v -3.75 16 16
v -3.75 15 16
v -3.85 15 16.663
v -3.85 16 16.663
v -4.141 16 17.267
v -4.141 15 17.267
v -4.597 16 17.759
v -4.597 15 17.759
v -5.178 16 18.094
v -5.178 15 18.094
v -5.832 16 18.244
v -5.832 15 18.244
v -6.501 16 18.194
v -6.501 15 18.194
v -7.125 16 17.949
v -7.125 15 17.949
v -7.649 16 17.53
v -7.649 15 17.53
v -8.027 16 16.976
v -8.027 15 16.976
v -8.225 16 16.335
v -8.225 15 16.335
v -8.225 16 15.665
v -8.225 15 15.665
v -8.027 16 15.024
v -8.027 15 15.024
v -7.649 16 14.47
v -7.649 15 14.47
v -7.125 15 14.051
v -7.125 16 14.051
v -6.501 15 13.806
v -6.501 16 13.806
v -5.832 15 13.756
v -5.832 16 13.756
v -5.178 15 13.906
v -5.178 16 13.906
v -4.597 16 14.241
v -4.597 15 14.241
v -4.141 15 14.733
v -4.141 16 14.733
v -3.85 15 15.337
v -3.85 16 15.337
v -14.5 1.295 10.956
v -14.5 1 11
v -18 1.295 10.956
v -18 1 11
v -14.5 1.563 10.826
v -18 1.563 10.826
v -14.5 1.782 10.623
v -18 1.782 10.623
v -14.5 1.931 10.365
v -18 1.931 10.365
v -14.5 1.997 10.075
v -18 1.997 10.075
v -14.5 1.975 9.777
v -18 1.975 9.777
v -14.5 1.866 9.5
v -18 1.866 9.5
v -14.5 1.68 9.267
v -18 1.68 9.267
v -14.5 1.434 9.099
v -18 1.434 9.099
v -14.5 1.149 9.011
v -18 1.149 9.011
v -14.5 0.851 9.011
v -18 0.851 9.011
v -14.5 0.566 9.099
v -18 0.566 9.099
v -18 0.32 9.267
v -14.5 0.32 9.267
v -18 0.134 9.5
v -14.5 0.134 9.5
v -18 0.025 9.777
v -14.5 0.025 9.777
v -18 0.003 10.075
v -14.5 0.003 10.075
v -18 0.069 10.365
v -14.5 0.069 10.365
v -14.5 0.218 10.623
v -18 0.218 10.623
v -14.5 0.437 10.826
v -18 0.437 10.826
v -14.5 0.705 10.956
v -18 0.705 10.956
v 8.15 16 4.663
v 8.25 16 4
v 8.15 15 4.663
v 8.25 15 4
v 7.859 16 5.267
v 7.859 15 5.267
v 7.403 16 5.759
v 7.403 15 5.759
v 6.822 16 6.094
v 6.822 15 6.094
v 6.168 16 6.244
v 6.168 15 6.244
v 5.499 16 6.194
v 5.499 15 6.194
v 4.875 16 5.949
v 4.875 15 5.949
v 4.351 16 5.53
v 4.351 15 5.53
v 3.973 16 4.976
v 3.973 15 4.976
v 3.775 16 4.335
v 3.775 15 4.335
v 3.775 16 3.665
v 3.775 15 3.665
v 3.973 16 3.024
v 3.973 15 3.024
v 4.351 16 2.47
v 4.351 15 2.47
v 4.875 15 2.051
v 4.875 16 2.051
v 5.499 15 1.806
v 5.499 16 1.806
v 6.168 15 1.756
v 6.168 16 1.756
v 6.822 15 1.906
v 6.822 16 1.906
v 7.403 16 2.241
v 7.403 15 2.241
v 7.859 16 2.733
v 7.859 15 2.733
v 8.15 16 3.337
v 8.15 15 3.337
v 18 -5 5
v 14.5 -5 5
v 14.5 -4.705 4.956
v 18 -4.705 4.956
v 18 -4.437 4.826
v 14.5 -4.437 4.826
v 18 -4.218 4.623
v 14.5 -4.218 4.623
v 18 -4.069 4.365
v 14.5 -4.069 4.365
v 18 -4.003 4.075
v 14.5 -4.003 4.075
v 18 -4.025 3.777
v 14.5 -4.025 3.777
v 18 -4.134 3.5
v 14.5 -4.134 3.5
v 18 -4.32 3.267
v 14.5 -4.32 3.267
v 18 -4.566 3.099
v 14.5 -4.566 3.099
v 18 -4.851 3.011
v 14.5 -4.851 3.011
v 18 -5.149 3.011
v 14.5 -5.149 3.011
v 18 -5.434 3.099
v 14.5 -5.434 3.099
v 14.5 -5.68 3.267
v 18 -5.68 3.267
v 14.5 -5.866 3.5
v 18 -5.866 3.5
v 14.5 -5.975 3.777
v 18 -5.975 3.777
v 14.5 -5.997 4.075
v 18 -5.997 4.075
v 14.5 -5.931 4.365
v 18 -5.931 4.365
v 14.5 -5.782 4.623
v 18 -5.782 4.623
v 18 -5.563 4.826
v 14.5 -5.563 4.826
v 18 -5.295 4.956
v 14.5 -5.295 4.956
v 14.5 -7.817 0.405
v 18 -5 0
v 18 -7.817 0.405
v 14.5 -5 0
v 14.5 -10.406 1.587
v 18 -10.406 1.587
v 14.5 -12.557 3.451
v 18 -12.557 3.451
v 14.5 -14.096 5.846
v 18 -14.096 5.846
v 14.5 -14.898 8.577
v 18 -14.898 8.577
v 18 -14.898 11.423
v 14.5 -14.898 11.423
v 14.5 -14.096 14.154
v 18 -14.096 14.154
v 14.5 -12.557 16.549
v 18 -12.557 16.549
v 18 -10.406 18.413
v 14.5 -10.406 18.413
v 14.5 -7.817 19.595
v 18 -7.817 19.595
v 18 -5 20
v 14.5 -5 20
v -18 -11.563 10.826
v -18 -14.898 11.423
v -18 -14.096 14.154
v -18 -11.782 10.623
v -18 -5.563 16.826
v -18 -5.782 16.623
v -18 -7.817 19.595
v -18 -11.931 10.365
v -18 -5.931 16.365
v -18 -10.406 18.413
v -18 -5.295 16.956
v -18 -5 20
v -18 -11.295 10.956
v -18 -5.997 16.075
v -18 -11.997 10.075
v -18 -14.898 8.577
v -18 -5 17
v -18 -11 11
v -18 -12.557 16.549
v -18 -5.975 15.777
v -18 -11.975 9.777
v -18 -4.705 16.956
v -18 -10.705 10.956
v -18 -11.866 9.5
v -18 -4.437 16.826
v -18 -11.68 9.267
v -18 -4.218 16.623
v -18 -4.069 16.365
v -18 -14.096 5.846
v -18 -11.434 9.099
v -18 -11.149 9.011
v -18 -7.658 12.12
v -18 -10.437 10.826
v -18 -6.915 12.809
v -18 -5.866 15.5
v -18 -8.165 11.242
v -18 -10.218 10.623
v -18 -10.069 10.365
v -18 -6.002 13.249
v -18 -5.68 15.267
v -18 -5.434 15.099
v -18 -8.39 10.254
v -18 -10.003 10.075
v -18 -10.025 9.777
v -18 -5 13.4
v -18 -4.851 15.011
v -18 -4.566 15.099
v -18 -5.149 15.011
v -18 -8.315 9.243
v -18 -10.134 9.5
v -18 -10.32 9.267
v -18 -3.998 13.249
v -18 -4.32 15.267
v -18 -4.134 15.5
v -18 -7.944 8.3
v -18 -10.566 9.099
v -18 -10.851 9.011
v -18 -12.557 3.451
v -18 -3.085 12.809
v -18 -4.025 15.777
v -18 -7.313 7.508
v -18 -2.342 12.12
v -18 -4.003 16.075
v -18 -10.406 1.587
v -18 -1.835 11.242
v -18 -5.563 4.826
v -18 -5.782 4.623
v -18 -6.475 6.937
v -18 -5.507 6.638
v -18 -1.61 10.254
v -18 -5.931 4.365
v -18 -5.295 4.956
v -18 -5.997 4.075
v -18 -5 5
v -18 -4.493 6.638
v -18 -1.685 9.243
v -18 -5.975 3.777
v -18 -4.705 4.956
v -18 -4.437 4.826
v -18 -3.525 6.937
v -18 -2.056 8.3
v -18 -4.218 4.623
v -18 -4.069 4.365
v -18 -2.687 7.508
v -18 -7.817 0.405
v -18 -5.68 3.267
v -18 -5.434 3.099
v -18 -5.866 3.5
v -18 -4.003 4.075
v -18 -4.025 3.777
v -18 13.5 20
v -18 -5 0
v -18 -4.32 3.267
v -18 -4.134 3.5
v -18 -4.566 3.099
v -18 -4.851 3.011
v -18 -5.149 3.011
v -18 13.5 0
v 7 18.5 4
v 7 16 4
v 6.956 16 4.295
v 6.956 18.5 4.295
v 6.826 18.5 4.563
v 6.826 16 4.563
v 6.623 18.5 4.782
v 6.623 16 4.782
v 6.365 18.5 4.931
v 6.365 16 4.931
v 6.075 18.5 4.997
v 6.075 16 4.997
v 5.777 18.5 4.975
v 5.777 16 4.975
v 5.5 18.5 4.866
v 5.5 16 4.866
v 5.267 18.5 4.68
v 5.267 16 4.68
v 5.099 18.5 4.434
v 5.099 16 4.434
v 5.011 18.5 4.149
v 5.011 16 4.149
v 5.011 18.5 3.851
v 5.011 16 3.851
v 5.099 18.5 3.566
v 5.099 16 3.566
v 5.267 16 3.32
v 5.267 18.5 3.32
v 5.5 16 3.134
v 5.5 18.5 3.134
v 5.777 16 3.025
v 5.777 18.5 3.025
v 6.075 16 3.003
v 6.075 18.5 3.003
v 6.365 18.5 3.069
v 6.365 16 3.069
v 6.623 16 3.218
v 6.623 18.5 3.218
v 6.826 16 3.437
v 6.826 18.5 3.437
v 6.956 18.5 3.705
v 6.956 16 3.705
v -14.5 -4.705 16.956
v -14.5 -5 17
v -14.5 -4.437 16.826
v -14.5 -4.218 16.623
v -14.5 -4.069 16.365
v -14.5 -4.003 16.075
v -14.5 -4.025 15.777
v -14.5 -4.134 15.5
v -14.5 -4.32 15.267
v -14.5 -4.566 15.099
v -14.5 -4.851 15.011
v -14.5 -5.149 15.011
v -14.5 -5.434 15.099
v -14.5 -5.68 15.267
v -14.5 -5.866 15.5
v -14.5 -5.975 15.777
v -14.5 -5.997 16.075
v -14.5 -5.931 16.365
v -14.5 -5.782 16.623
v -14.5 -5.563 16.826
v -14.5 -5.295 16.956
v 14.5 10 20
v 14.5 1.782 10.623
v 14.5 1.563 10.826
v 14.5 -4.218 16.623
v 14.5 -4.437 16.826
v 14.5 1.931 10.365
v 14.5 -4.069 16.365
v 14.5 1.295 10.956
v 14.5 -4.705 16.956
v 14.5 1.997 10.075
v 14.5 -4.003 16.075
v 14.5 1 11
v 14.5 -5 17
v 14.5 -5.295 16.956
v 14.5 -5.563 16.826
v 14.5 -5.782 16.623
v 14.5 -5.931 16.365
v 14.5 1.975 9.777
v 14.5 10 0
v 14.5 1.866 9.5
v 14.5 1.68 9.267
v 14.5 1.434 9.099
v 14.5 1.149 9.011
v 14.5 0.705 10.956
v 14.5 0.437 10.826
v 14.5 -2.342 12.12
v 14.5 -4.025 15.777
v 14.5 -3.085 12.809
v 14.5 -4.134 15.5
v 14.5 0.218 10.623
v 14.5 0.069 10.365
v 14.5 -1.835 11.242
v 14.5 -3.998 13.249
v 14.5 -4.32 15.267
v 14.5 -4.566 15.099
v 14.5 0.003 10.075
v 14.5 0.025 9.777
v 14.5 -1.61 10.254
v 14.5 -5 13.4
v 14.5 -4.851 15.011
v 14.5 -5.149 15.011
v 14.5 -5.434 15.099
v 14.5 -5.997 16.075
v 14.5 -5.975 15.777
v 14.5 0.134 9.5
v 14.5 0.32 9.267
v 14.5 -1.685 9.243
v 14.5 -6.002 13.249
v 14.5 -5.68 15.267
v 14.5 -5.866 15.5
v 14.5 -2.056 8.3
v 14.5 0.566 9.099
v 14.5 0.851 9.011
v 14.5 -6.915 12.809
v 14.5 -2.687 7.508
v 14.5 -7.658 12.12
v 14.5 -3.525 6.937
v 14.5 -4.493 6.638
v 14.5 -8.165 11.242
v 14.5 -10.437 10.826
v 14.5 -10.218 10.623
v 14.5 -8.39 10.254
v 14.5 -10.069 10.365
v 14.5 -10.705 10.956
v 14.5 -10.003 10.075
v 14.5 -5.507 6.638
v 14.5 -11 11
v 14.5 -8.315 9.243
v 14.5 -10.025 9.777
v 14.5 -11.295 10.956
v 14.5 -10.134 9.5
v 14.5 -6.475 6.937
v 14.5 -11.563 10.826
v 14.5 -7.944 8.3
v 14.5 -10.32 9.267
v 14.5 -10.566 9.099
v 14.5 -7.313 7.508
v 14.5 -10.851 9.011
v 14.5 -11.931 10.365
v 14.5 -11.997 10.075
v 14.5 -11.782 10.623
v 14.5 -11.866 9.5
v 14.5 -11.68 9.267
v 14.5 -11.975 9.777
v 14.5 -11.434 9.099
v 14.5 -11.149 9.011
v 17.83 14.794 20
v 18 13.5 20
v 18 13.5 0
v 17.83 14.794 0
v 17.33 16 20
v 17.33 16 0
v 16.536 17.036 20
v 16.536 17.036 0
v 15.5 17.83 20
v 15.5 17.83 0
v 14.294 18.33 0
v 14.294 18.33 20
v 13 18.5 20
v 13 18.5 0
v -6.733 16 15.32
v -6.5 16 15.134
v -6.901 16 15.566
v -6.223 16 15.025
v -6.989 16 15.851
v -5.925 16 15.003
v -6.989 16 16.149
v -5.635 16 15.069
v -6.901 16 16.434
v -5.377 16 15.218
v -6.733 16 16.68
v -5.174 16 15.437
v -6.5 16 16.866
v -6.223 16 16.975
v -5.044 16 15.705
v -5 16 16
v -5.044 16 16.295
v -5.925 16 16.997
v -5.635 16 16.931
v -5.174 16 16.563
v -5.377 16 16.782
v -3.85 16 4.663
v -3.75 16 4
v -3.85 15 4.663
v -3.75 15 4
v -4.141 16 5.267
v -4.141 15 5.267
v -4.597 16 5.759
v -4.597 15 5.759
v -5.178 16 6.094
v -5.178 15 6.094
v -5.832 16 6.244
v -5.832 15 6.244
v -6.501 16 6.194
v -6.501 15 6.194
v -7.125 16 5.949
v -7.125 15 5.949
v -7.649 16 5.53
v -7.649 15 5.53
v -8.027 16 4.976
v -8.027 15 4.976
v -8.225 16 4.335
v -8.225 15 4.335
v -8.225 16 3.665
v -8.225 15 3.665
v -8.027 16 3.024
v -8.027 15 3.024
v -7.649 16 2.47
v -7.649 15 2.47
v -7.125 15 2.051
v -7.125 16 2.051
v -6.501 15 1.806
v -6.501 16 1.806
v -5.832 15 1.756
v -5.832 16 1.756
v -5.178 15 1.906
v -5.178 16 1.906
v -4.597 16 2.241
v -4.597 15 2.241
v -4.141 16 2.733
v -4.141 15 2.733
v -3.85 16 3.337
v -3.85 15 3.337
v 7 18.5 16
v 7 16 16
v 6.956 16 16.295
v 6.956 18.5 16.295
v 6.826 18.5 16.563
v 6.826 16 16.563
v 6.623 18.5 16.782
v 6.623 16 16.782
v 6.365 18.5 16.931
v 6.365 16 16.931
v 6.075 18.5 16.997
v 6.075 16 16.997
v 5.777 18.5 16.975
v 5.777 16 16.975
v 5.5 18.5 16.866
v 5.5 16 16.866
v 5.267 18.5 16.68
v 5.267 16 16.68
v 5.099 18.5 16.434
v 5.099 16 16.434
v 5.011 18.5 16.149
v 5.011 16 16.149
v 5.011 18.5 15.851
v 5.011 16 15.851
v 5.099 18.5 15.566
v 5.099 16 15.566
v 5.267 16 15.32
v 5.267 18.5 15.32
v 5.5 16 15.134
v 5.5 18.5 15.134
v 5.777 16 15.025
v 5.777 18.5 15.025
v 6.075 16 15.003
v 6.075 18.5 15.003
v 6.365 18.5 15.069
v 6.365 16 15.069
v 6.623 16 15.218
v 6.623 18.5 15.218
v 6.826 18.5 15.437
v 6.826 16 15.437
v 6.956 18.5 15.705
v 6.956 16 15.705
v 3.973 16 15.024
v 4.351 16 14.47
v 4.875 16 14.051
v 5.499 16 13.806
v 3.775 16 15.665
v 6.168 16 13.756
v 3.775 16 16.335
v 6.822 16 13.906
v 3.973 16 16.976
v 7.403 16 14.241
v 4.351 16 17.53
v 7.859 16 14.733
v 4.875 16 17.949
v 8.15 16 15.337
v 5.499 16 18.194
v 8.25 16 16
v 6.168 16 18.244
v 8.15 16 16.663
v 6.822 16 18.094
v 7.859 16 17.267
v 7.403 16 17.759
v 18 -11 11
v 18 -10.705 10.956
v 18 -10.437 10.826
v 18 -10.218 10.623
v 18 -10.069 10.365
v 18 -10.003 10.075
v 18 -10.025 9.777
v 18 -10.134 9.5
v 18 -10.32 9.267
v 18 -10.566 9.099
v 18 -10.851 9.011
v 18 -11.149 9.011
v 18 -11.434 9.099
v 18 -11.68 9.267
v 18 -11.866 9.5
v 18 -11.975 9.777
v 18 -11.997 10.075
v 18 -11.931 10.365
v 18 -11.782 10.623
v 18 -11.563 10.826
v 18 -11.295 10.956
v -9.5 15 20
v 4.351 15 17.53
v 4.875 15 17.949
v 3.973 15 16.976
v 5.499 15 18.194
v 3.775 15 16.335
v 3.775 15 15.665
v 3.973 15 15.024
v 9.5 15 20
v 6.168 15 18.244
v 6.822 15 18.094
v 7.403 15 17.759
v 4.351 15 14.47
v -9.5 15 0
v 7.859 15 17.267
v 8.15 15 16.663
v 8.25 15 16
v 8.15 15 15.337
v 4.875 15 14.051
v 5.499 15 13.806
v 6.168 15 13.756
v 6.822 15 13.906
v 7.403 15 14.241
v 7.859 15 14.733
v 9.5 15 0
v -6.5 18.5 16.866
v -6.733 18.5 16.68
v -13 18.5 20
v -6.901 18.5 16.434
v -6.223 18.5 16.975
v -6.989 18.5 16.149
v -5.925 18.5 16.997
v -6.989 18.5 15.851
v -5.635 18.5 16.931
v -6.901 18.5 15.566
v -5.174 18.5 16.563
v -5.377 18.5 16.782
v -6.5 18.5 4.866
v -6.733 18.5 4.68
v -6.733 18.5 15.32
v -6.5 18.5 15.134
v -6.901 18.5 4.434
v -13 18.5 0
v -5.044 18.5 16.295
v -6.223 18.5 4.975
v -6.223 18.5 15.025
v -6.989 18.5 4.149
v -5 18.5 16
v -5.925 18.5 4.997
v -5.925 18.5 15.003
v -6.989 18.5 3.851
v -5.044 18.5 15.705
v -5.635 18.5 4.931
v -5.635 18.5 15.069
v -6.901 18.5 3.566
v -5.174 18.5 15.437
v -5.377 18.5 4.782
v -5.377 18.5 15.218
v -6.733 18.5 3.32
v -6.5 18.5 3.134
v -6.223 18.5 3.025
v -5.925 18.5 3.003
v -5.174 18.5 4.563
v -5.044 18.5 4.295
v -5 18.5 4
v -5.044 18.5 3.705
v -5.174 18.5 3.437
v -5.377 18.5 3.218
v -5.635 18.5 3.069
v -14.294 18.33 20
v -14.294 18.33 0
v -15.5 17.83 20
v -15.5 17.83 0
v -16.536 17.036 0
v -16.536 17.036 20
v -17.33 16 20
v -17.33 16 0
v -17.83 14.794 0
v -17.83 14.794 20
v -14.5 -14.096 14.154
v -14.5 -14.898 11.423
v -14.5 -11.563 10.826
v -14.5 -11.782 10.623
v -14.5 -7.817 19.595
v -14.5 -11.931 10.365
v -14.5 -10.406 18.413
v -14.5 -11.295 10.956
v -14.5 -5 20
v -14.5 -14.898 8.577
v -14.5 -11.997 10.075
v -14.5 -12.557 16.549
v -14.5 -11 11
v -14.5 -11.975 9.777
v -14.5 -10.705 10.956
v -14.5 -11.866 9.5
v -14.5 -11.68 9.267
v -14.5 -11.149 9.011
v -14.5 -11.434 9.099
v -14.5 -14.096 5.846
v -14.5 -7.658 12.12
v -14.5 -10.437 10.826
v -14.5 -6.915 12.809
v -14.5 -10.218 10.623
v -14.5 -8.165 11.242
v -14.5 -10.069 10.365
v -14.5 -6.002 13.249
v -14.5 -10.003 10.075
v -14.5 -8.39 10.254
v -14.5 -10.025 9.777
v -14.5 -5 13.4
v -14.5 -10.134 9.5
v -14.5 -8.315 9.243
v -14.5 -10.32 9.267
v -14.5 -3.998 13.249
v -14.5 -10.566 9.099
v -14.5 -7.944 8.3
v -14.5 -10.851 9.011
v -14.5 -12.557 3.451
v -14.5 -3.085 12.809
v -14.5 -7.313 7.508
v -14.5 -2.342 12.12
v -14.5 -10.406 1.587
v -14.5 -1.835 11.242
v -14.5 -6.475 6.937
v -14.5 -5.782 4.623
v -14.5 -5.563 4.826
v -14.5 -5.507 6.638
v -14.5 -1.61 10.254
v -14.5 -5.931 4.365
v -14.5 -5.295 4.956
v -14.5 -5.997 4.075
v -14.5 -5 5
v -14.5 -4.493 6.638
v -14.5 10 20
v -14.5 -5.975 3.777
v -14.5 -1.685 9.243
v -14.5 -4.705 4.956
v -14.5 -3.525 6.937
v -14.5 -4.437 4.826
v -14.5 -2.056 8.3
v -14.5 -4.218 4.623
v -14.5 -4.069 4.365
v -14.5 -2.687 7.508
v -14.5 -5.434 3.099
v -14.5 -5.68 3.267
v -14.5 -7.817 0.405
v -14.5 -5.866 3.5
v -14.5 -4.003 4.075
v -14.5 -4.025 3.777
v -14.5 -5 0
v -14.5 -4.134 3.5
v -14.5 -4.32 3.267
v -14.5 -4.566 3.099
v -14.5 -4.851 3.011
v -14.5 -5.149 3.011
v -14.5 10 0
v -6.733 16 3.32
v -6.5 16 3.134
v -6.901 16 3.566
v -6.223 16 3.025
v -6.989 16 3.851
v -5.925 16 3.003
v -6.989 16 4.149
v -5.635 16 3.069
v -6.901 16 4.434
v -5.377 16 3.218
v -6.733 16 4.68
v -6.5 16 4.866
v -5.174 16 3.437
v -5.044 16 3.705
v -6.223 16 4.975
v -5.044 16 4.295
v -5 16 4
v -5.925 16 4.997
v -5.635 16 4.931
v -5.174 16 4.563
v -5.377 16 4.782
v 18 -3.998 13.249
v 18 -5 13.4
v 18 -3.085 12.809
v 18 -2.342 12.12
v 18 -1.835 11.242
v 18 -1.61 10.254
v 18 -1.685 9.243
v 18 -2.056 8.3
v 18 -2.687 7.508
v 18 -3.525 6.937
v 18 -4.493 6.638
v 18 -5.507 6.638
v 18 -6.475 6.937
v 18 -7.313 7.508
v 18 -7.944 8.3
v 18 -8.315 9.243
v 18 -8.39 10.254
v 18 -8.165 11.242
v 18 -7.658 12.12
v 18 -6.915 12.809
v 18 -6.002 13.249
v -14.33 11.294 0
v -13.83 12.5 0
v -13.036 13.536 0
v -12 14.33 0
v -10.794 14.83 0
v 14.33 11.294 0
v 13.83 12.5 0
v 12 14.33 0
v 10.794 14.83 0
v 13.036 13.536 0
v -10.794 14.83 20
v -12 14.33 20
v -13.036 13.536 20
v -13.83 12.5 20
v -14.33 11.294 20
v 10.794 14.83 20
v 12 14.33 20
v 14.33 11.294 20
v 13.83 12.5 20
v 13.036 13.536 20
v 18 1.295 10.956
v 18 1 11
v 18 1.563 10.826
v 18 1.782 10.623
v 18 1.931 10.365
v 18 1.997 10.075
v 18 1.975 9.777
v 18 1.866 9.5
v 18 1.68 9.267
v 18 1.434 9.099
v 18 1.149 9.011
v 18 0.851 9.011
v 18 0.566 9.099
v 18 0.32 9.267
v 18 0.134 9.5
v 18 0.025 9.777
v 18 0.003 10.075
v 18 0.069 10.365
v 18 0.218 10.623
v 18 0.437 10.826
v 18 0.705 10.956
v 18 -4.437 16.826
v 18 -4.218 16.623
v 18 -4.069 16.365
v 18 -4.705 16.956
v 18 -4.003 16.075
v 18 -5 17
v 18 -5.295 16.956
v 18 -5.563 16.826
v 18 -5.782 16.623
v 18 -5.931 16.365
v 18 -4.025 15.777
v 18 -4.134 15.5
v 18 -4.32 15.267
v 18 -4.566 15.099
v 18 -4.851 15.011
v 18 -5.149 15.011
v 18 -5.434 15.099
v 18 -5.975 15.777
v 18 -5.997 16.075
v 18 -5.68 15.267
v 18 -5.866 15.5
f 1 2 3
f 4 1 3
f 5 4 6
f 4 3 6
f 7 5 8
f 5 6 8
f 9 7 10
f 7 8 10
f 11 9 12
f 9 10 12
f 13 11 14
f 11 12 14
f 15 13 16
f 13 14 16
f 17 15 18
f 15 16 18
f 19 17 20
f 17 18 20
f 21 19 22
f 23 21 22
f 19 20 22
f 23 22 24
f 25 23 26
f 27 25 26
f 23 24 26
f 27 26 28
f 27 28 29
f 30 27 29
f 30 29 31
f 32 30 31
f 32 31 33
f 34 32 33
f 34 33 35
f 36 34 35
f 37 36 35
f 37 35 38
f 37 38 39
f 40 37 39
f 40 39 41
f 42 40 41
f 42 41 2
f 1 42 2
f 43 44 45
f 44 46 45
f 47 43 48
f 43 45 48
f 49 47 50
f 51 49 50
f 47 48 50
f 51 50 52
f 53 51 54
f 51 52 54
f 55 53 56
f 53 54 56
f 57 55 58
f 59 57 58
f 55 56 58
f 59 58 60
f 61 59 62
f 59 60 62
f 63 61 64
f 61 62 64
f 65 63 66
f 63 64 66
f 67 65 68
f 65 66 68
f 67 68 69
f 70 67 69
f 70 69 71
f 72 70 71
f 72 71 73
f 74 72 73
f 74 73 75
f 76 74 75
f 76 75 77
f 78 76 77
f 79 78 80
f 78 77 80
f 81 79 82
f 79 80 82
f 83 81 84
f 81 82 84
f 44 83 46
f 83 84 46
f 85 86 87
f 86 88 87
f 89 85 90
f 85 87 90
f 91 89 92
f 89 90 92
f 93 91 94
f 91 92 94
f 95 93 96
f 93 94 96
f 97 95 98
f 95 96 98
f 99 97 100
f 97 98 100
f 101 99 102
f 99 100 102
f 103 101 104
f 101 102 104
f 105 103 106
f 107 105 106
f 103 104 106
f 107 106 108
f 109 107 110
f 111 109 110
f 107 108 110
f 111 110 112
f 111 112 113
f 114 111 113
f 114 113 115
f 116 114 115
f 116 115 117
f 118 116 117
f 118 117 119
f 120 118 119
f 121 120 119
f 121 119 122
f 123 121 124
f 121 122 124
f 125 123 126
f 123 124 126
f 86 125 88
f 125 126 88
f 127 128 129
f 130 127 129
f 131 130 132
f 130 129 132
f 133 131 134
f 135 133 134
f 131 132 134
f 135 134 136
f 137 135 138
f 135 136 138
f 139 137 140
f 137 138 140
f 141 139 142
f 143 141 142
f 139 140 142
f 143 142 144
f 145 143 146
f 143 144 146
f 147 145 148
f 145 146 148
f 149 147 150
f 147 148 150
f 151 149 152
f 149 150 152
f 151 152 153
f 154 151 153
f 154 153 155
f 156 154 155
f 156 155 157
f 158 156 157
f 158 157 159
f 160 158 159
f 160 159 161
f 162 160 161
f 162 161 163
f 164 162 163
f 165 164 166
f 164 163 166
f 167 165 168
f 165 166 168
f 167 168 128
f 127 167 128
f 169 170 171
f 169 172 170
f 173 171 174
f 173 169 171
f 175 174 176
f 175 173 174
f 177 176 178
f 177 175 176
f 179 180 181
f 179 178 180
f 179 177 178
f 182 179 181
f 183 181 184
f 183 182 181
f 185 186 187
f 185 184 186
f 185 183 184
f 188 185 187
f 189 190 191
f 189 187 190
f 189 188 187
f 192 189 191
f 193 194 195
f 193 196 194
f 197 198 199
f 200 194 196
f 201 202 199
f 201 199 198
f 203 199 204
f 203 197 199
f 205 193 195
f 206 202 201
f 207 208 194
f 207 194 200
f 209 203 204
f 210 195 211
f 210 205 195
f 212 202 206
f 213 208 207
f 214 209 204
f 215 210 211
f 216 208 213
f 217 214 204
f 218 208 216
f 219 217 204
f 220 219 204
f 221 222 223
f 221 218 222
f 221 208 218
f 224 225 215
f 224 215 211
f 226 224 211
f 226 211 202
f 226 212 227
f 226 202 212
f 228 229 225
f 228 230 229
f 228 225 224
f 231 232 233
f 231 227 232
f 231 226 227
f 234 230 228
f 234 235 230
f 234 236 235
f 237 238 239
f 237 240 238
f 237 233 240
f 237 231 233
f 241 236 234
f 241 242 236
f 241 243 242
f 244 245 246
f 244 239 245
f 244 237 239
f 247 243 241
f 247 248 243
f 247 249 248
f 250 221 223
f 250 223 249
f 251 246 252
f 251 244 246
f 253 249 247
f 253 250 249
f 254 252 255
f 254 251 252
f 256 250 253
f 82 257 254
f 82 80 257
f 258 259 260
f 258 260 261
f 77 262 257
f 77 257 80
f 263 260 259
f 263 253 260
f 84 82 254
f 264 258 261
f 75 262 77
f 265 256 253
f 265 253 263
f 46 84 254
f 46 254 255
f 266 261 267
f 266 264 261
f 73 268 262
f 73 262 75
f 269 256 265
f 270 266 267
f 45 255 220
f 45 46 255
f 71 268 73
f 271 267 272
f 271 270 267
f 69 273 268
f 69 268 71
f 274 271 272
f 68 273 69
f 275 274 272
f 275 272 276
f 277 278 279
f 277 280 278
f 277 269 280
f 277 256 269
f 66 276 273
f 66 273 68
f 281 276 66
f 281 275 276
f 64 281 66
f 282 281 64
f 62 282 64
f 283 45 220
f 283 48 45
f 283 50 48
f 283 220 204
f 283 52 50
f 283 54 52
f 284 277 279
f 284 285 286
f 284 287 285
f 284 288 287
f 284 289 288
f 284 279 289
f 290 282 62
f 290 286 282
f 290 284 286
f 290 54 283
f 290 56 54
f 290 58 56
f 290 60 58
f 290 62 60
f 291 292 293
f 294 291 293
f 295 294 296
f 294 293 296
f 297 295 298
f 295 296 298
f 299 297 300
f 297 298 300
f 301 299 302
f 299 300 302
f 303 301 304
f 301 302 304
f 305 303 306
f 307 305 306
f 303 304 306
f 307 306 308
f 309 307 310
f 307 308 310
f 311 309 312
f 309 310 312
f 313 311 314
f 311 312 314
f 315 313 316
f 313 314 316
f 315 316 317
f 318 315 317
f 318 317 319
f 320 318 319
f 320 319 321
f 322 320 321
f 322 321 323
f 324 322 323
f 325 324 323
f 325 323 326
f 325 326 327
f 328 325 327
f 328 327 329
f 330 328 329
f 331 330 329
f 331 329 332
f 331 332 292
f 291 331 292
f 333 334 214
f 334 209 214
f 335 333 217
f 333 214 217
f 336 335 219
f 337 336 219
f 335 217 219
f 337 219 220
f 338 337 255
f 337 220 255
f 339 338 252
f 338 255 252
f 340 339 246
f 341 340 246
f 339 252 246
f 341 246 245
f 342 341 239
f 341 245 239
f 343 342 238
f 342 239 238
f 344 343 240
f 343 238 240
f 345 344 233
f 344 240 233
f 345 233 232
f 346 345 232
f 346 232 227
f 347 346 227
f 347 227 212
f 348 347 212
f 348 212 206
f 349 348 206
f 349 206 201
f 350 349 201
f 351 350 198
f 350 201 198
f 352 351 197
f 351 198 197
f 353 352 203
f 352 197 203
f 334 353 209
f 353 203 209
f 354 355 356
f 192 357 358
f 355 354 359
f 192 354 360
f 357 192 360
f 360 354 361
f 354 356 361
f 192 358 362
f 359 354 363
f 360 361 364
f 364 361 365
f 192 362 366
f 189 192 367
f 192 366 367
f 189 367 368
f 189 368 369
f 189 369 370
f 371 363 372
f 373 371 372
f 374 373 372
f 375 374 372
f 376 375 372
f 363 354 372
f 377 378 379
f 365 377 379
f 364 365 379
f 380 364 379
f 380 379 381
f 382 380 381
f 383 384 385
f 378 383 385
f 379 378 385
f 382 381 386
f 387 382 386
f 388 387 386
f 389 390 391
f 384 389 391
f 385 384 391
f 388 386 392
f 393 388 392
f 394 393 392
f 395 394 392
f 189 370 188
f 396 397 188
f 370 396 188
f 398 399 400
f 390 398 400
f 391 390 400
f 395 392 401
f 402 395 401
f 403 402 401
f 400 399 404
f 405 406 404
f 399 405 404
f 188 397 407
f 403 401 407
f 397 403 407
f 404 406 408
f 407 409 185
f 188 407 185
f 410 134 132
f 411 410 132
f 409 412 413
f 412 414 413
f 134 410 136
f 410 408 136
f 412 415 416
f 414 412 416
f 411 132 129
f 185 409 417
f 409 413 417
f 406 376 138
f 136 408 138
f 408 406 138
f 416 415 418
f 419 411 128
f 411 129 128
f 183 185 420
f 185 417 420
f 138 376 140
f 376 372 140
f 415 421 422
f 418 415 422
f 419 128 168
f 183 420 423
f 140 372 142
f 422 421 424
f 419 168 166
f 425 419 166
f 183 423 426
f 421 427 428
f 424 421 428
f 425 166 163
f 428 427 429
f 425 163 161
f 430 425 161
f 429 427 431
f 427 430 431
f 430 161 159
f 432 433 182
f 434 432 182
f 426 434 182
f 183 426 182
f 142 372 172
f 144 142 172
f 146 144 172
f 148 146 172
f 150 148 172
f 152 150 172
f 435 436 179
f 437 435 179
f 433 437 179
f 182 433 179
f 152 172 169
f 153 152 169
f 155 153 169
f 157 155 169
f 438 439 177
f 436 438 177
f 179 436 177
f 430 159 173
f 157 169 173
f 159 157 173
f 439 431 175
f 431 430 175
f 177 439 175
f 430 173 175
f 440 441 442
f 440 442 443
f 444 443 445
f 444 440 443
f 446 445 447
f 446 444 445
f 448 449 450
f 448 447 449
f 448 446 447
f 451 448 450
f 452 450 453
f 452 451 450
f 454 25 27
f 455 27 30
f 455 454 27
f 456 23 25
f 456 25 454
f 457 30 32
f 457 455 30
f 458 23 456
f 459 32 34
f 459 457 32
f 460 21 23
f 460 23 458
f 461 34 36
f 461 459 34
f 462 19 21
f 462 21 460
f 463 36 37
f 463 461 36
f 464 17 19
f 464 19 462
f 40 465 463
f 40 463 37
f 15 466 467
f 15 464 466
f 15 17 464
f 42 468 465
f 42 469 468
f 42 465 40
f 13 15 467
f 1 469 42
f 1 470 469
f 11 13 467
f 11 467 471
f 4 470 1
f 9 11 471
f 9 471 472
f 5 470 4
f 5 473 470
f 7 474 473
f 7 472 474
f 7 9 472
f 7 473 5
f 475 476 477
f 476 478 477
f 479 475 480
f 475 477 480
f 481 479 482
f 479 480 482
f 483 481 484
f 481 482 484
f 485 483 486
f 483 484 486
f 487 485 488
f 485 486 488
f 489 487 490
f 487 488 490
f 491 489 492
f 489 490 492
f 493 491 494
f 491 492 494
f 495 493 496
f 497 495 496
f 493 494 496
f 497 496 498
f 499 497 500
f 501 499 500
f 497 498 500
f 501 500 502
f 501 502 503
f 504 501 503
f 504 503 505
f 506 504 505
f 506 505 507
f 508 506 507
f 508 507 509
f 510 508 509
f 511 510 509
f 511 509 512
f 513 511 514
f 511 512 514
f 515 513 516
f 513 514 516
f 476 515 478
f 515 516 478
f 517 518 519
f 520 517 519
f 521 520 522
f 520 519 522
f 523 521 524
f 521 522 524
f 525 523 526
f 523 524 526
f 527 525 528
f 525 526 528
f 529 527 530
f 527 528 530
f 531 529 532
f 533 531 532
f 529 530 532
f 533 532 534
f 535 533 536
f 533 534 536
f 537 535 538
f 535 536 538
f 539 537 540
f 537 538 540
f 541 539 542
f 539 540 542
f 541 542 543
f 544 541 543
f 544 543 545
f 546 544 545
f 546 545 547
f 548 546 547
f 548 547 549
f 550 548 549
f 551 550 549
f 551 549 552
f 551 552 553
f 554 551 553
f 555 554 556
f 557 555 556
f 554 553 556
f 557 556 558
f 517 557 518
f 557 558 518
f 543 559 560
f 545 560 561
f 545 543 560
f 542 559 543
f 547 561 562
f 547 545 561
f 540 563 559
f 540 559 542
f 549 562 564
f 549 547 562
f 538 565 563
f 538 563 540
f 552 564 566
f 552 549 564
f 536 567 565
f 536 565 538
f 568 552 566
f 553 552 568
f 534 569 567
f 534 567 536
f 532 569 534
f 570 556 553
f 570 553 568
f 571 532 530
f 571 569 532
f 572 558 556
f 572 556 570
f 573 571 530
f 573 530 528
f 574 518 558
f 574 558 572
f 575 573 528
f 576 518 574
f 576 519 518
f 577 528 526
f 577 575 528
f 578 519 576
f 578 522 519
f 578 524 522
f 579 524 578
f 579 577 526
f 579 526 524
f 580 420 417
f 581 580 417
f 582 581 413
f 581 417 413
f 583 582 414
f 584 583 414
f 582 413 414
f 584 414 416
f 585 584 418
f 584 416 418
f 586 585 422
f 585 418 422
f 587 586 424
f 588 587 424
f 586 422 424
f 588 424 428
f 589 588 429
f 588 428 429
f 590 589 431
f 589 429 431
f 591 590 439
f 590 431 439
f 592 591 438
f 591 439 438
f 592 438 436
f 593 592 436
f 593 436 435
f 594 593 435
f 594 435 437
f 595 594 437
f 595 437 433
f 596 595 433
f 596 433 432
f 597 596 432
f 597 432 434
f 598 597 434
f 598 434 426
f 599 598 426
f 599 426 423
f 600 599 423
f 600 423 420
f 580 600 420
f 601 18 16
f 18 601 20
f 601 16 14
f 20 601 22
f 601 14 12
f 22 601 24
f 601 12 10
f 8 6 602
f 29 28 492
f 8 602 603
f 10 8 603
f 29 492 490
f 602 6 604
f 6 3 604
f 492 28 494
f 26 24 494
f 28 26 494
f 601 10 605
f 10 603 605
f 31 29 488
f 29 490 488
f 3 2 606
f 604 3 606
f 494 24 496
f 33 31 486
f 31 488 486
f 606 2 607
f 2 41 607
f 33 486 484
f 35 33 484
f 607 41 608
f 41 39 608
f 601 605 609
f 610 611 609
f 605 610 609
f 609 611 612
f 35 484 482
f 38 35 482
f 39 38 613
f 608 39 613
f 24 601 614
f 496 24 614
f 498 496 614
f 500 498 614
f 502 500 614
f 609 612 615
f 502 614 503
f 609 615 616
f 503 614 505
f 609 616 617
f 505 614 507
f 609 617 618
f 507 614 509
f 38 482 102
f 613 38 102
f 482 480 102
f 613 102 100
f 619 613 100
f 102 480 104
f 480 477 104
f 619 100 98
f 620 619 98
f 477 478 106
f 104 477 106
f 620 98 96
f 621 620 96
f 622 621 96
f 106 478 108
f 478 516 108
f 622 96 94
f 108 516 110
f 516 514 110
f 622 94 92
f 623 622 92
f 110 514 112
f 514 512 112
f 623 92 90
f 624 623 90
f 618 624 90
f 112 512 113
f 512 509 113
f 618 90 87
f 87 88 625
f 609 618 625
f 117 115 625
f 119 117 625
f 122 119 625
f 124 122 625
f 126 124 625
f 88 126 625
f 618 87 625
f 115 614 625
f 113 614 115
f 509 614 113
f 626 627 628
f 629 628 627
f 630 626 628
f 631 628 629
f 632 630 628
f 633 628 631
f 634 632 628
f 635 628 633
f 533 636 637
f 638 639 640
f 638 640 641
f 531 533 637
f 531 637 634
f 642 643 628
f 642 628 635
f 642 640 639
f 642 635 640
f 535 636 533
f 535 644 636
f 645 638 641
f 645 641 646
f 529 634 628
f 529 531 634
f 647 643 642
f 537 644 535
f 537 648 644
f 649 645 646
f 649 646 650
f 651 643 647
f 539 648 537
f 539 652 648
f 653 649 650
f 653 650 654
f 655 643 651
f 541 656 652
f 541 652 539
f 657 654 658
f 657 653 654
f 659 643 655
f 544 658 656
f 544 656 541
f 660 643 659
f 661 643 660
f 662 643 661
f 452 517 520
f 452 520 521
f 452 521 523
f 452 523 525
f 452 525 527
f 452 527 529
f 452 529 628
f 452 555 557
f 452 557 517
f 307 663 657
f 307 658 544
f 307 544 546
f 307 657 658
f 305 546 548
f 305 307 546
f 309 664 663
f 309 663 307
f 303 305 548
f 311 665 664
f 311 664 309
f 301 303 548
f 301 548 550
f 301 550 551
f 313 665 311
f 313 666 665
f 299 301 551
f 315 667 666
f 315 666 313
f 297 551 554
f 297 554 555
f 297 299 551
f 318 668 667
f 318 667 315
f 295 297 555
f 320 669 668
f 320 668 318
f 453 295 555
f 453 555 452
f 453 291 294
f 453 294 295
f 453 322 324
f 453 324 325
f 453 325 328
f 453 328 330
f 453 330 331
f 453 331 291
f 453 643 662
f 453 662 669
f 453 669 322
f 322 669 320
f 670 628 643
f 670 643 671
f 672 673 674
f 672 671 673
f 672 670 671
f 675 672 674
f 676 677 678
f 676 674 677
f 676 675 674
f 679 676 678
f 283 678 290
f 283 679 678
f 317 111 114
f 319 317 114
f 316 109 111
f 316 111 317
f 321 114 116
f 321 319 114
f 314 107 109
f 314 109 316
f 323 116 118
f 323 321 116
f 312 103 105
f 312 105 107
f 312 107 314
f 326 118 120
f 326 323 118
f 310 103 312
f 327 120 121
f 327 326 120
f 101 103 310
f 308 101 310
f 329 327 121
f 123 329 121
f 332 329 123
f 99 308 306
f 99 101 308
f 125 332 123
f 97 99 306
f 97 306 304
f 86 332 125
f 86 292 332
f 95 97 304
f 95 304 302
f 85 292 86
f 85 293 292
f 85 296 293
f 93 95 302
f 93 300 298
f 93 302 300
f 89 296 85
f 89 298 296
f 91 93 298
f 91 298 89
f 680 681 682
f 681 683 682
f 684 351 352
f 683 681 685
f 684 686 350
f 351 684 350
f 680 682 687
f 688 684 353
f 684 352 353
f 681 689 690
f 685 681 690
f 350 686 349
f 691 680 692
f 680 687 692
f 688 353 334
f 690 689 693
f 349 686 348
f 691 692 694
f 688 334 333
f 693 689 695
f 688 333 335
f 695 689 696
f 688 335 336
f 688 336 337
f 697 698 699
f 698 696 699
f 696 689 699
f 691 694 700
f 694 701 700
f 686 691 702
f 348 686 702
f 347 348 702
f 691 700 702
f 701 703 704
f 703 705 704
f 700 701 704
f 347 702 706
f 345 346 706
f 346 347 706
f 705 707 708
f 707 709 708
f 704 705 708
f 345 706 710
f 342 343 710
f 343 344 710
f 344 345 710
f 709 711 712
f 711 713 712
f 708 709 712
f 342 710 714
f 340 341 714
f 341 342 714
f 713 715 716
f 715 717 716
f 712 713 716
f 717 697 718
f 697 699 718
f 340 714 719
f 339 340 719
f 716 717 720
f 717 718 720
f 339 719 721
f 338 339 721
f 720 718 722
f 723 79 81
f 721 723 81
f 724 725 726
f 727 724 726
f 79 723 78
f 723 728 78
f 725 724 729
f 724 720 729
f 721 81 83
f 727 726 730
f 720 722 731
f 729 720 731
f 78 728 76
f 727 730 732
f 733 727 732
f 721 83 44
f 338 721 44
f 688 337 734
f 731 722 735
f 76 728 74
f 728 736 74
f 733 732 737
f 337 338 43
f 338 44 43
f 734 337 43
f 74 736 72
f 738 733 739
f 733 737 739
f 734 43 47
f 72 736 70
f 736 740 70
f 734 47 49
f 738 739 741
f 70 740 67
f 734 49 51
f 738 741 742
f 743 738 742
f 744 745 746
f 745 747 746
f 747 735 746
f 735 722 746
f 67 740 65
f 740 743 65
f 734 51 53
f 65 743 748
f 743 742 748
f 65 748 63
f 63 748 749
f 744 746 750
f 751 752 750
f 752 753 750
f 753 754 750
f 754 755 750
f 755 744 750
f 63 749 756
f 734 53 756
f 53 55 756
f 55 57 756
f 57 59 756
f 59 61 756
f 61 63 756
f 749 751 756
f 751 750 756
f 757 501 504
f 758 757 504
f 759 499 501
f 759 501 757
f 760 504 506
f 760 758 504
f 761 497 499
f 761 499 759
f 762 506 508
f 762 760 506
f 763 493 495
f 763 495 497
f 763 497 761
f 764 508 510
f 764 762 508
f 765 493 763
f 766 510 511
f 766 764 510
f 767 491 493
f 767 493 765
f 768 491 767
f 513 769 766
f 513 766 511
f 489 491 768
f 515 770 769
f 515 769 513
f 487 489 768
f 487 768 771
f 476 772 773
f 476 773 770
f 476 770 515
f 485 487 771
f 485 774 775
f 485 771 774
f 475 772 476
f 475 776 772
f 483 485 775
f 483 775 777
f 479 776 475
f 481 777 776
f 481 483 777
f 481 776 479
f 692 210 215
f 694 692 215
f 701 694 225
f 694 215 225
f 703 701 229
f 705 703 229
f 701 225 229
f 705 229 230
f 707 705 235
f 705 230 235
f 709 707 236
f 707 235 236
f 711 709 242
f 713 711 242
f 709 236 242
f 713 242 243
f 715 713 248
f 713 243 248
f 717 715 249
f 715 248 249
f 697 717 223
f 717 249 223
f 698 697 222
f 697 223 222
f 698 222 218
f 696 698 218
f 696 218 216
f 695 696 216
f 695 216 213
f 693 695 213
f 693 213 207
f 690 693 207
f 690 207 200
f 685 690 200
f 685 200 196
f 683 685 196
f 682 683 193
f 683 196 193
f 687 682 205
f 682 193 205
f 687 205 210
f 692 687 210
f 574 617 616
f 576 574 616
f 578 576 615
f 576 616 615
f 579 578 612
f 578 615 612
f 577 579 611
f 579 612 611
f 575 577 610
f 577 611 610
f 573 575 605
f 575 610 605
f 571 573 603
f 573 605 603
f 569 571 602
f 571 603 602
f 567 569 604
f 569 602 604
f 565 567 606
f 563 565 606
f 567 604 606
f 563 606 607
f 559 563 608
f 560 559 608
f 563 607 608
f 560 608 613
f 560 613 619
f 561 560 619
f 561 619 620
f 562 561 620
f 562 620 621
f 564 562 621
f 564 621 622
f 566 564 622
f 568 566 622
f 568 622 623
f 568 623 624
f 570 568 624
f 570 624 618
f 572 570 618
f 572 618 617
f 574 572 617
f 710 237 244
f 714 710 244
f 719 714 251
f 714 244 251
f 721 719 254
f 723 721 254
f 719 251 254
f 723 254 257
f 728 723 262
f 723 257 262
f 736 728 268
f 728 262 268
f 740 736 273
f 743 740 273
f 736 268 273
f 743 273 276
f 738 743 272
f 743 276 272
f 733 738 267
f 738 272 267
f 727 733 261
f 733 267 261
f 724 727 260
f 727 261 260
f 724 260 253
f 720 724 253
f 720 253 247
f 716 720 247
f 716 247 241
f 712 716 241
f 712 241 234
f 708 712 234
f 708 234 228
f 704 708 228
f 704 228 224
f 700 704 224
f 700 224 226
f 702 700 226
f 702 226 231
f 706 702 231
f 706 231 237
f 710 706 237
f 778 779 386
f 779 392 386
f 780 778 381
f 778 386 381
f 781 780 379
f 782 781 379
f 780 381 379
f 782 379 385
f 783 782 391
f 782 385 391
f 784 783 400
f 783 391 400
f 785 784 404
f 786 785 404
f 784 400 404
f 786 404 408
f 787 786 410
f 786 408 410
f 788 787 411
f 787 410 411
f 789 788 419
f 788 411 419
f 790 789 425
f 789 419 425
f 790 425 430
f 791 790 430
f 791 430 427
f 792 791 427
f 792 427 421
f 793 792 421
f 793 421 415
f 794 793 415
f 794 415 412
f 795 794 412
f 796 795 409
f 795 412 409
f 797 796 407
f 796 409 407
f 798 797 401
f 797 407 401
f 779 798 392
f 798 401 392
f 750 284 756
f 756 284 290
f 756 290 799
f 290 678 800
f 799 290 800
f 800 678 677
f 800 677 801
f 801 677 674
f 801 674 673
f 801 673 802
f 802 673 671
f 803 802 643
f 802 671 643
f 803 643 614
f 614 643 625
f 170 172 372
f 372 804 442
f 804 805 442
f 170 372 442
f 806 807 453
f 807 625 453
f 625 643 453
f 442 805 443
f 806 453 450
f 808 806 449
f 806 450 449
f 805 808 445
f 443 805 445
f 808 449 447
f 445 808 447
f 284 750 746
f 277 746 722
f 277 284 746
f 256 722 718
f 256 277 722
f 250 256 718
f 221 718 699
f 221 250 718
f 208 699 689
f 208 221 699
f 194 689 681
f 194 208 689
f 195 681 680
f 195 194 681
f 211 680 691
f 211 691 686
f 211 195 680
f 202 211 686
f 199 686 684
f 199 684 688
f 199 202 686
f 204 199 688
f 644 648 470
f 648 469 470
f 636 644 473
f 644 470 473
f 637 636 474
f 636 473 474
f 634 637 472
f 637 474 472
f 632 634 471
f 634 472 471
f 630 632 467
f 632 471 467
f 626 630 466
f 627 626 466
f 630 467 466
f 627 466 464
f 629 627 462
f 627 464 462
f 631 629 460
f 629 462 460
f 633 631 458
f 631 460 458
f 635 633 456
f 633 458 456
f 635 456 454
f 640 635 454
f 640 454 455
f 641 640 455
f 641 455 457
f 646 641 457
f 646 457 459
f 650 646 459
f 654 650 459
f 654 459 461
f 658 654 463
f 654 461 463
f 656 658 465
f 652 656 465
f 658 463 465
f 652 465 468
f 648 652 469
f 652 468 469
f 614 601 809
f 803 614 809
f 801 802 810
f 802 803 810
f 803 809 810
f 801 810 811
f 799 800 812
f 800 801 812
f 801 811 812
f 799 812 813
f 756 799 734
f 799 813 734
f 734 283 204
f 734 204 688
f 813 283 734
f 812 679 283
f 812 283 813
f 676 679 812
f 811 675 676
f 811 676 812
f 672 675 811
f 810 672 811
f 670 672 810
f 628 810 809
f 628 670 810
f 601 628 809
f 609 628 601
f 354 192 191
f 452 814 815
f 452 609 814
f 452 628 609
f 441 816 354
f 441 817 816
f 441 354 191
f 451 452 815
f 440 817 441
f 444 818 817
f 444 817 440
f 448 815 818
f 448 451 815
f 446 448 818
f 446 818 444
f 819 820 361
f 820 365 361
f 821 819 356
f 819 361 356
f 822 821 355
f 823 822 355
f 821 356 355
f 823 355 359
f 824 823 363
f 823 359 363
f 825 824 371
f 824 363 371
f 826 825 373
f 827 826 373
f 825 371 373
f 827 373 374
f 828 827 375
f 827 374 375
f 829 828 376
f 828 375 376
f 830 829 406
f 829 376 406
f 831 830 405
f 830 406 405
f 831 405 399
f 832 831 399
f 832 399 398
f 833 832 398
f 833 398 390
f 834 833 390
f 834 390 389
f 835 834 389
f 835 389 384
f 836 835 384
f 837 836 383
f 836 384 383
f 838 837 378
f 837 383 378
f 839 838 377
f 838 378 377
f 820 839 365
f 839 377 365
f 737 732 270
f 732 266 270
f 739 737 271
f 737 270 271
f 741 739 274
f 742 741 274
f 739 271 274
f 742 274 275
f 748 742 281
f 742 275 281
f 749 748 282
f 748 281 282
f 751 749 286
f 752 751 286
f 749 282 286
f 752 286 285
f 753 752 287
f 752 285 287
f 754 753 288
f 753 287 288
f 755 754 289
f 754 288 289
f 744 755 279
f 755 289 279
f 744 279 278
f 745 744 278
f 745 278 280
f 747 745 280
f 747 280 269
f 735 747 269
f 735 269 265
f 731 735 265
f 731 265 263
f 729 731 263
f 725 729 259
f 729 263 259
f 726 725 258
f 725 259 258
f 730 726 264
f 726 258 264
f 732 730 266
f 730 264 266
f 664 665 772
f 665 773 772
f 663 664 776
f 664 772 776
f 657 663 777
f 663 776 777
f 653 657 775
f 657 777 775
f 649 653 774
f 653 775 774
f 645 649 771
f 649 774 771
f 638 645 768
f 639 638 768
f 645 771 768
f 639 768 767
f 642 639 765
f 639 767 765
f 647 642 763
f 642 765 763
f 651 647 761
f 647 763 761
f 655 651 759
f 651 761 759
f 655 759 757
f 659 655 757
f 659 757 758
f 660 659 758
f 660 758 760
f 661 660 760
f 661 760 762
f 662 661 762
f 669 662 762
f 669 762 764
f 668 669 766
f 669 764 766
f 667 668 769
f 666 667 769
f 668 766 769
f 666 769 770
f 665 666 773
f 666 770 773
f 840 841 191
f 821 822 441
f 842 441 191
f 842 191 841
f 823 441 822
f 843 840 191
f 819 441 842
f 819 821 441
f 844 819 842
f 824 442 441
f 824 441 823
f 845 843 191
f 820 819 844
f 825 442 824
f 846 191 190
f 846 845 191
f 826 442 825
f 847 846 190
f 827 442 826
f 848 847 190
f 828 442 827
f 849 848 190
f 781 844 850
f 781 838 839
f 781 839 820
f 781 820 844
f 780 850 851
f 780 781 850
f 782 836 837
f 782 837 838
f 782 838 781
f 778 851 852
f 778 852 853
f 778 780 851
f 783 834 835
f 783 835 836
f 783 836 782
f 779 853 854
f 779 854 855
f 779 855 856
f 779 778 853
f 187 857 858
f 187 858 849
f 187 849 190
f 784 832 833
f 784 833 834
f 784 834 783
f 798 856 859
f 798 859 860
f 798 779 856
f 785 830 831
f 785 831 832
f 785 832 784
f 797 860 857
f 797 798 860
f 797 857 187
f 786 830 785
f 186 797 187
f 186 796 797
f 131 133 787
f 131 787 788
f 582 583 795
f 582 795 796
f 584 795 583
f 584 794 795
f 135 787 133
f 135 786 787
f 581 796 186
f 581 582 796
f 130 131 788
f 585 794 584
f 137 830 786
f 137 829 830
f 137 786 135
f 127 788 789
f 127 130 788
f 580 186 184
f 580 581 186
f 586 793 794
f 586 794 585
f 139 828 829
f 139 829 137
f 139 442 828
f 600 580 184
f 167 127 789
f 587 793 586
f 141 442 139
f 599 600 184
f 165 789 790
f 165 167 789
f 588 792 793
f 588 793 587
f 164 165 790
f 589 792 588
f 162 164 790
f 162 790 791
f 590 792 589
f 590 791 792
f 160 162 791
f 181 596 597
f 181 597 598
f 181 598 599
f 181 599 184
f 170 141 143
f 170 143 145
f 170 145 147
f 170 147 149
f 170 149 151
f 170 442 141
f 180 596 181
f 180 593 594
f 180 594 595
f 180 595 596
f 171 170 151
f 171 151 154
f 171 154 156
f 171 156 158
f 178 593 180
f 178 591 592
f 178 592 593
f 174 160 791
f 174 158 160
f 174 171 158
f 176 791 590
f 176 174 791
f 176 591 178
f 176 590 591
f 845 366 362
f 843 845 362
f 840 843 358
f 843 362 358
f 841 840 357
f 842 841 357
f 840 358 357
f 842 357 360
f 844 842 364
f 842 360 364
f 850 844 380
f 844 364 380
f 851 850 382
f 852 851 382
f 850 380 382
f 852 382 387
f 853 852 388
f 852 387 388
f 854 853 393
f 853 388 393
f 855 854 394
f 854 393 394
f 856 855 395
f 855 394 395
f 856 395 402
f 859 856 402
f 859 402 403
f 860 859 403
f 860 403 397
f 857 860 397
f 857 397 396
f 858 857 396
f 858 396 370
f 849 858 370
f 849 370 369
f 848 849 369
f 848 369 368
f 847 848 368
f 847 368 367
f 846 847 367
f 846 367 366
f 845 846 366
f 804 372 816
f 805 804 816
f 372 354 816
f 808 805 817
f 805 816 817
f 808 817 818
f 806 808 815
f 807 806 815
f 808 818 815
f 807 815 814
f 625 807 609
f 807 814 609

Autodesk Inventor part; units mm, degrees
ref_plane "YZ Plane" through (0, 0, 0) normal (1, 0, 0) x (0, 1, 0)
ref_plane "XZ Plane" through (0, 0, 0) normal (0, 1, 0) x (-1, 0, 0)
ref_plane "XY Plane" through (0, 0, 0) normal (0, 0, 1) x (1, 0, 0)
sketch "Sketch1" plane through (0, 0, 0) normal (0, 0, 1) x (1, 0, 0)
  line L0 (14.5, -15) -> (-14.5, -15) construction
  line L1 (-14.5, -15) -> (-14.5, 15)
  line L2 (-14.5, 15) -> (14.5, 15)
  line L3 (14.5, 15) -> (14.5, -15)
  line L4 (14.5, -15) -> (-14.5, 15) construction
  line L5 (-14.5, -15) -> (14.5, 15) construction
  line L6 (-14.5, -15) -> (-18, -15)
  line L7 (-18, -15) -> (-18, 18.5)
  line L8 (-18, 18.5) -> (18, 18.5)
  line L9 (18, 18.5) -> (18, -15)
  line L10 (18, -15) -> (14.5, -15)
  point P0 (0, 0)
  dimension "d0" = 29
  dimension "d1" = 30
  dimension "d2" = 3.5
  dimension "d3" = 33.5
  dimension "d4" = 36
extrude "Extrusion1" add sketch "Sketch1" along normal blind 20
sketch "Sketch2" plane through (-18, -15, 0) normal (-1, 0, 0) x (0, 0, 1)
  arc A0 (0, 10) -> (20, 10) centre (10, 10) ccw
  line L0 (20, 33.5) -> (20, 0) projected
  line L1 (0, 0) -> (20, 0) construction
  line L2 (0, 10) -> (0, 0)
  line L3 (0, 0) -> (20, 0) projected
  line L4 (0, 0) -> (20, 0)
  line L5 (20, 0) -> (20, 10)
  circle A1 centre (10, 10) radius 3.4
  circle A2 centre (10, 10) radius 6 construction
  circle A3 centre (4, 10) radius 1
  circle A4 centre (16, 10) radius 1
  circle A5 centre (10, 16) radius 1
  circle A6 centre (10, 4) radius 1
  point P0 (0, 15)
  point P1 (10, 0)
  dimension "d7" = 20
  dimension "d8" = 10
  dimension "d9" = 10
  dimension "d10" = 6.8
  dimension "d11" = 12
  dimension "d12" = 2
  dimension "d13" = 2
  dimension "d14" = 2
  dimension "d15" = 2
extrude "Extrusion2" cut sketch "Sketch2" against normal through all
fillet "Fillet1" radius 5 4 edges at (-14.5, 15, 10) (14.5, 15, 10) (-18, 18.5, 10) (18, 18.5, 10)
sketch "Sketch3" plane through (-9.5, 15, 0) normal (0, -1, 0) x (1, 0, 0)
  line L0 (-8.2697, 20) -> (0, 20) projected
  line L1 (0, 20) -> (19, 20) construction
  line L2 (19, 20) -> (27.2697, 20) projected
  line L3 (27.2697, 20) -> (27.2697, 0) projected
  line L4 (27.2697, 0) -> (19, 0) projected
  line L5 (19, 20) -> (19, 0) construction
  line L6 (-8.2697, 0) -> (-8.2697, 20) projected
  line L7 (0, 0) -> (-8.2697, 0) projected
  line L8 (0, 20) -> (0, 0) construction
  line L9 (19, 0) -> (0, 0) construction
  line L10 (3.5, 16) -> (15.5, 16) construction
  line L11 (15.5, 16) -> (15.5, 4) construction
  line L12 (15.5, 4) -> (3.5, 4) construction
  line L13 (3.5, 4) -> (3.5, 16) construction
  line L14 (3.5, 16) -> (15.5, 4) construction
  line L15 (15.5, 16) -> (3.5, 4) construction
  circle A0 centre (3.5, 16) radius 1
  circle A1 centre (15.5, 16) radius 1
  circle A2 centre (3.5, 4) radius 1
  circle A3 centre (15.5, 4) radius 1
  point P0 (9.5, 0)
  point P1 (9.5, 10)
  dimension "d19" = 12
  dimension "d20" = 12
  dimension "d21" = 10
  dimension "d22" = 9.5
  dimension "d23" = 2
  dimension "d24" = 2
  dimension "d25" = 2
  dimension "d26" = 2
extrude "Extrusion3" cut sketch "Sketch3" against normal through all
sketch "Sketch4" plane through (-9.5, 15, 0) normal (0, -1, 0) x (1, 0, 0)
  circle A0 centre (3.5, 4) radius 1 construction
  circle A1 centre (15.5, 16) radius 1 construction
  circle A2 centre (15.5, 4) radius 1 construction
  circle A3 centre (3.5, 16) radius 1 construction
  line L0 (-8.2697, 20) -> (0, 20) projected
  line L1 (0, 20) -> (19, 20) construction
  line L2 (19, 20) -> (27.2697, 20) projected
  line L3 (27.2697, 20) -> (27.2697, 0) projected
  line L4 (27.2697, 0) -> (19, 0) projected
  line L5 (19, 20) -> (19, 0) construction
  line L6 (-8.2697, 0) -> (-8.2697, 20) projected
  line L7 (0, 0) -> (-8.2697, 0) projected
  line L8 (0, 20) -> (0, 0) construction
  line L9 (19, 0) -> (0, 0) construction
  circle A4 centre (3.5, 16) radius 2.25
  circle A5 centre (15.5, 16) radius 2.25
  circle A6 centre (15.5, 4) radius 2.25
  circle A7 centre (3.5, 4) radius 2.25
  point P0 (9.5, 0)
  dimension "d29" = 4.5
  dimension "d30" = 4.5
  dimension "d31" = 4.5
  dimension "d32" = 4.5
extrude "Extrusion4" cut sketch "Sketch4" against normal blind 1
properties part number "Motor_Bracket"
